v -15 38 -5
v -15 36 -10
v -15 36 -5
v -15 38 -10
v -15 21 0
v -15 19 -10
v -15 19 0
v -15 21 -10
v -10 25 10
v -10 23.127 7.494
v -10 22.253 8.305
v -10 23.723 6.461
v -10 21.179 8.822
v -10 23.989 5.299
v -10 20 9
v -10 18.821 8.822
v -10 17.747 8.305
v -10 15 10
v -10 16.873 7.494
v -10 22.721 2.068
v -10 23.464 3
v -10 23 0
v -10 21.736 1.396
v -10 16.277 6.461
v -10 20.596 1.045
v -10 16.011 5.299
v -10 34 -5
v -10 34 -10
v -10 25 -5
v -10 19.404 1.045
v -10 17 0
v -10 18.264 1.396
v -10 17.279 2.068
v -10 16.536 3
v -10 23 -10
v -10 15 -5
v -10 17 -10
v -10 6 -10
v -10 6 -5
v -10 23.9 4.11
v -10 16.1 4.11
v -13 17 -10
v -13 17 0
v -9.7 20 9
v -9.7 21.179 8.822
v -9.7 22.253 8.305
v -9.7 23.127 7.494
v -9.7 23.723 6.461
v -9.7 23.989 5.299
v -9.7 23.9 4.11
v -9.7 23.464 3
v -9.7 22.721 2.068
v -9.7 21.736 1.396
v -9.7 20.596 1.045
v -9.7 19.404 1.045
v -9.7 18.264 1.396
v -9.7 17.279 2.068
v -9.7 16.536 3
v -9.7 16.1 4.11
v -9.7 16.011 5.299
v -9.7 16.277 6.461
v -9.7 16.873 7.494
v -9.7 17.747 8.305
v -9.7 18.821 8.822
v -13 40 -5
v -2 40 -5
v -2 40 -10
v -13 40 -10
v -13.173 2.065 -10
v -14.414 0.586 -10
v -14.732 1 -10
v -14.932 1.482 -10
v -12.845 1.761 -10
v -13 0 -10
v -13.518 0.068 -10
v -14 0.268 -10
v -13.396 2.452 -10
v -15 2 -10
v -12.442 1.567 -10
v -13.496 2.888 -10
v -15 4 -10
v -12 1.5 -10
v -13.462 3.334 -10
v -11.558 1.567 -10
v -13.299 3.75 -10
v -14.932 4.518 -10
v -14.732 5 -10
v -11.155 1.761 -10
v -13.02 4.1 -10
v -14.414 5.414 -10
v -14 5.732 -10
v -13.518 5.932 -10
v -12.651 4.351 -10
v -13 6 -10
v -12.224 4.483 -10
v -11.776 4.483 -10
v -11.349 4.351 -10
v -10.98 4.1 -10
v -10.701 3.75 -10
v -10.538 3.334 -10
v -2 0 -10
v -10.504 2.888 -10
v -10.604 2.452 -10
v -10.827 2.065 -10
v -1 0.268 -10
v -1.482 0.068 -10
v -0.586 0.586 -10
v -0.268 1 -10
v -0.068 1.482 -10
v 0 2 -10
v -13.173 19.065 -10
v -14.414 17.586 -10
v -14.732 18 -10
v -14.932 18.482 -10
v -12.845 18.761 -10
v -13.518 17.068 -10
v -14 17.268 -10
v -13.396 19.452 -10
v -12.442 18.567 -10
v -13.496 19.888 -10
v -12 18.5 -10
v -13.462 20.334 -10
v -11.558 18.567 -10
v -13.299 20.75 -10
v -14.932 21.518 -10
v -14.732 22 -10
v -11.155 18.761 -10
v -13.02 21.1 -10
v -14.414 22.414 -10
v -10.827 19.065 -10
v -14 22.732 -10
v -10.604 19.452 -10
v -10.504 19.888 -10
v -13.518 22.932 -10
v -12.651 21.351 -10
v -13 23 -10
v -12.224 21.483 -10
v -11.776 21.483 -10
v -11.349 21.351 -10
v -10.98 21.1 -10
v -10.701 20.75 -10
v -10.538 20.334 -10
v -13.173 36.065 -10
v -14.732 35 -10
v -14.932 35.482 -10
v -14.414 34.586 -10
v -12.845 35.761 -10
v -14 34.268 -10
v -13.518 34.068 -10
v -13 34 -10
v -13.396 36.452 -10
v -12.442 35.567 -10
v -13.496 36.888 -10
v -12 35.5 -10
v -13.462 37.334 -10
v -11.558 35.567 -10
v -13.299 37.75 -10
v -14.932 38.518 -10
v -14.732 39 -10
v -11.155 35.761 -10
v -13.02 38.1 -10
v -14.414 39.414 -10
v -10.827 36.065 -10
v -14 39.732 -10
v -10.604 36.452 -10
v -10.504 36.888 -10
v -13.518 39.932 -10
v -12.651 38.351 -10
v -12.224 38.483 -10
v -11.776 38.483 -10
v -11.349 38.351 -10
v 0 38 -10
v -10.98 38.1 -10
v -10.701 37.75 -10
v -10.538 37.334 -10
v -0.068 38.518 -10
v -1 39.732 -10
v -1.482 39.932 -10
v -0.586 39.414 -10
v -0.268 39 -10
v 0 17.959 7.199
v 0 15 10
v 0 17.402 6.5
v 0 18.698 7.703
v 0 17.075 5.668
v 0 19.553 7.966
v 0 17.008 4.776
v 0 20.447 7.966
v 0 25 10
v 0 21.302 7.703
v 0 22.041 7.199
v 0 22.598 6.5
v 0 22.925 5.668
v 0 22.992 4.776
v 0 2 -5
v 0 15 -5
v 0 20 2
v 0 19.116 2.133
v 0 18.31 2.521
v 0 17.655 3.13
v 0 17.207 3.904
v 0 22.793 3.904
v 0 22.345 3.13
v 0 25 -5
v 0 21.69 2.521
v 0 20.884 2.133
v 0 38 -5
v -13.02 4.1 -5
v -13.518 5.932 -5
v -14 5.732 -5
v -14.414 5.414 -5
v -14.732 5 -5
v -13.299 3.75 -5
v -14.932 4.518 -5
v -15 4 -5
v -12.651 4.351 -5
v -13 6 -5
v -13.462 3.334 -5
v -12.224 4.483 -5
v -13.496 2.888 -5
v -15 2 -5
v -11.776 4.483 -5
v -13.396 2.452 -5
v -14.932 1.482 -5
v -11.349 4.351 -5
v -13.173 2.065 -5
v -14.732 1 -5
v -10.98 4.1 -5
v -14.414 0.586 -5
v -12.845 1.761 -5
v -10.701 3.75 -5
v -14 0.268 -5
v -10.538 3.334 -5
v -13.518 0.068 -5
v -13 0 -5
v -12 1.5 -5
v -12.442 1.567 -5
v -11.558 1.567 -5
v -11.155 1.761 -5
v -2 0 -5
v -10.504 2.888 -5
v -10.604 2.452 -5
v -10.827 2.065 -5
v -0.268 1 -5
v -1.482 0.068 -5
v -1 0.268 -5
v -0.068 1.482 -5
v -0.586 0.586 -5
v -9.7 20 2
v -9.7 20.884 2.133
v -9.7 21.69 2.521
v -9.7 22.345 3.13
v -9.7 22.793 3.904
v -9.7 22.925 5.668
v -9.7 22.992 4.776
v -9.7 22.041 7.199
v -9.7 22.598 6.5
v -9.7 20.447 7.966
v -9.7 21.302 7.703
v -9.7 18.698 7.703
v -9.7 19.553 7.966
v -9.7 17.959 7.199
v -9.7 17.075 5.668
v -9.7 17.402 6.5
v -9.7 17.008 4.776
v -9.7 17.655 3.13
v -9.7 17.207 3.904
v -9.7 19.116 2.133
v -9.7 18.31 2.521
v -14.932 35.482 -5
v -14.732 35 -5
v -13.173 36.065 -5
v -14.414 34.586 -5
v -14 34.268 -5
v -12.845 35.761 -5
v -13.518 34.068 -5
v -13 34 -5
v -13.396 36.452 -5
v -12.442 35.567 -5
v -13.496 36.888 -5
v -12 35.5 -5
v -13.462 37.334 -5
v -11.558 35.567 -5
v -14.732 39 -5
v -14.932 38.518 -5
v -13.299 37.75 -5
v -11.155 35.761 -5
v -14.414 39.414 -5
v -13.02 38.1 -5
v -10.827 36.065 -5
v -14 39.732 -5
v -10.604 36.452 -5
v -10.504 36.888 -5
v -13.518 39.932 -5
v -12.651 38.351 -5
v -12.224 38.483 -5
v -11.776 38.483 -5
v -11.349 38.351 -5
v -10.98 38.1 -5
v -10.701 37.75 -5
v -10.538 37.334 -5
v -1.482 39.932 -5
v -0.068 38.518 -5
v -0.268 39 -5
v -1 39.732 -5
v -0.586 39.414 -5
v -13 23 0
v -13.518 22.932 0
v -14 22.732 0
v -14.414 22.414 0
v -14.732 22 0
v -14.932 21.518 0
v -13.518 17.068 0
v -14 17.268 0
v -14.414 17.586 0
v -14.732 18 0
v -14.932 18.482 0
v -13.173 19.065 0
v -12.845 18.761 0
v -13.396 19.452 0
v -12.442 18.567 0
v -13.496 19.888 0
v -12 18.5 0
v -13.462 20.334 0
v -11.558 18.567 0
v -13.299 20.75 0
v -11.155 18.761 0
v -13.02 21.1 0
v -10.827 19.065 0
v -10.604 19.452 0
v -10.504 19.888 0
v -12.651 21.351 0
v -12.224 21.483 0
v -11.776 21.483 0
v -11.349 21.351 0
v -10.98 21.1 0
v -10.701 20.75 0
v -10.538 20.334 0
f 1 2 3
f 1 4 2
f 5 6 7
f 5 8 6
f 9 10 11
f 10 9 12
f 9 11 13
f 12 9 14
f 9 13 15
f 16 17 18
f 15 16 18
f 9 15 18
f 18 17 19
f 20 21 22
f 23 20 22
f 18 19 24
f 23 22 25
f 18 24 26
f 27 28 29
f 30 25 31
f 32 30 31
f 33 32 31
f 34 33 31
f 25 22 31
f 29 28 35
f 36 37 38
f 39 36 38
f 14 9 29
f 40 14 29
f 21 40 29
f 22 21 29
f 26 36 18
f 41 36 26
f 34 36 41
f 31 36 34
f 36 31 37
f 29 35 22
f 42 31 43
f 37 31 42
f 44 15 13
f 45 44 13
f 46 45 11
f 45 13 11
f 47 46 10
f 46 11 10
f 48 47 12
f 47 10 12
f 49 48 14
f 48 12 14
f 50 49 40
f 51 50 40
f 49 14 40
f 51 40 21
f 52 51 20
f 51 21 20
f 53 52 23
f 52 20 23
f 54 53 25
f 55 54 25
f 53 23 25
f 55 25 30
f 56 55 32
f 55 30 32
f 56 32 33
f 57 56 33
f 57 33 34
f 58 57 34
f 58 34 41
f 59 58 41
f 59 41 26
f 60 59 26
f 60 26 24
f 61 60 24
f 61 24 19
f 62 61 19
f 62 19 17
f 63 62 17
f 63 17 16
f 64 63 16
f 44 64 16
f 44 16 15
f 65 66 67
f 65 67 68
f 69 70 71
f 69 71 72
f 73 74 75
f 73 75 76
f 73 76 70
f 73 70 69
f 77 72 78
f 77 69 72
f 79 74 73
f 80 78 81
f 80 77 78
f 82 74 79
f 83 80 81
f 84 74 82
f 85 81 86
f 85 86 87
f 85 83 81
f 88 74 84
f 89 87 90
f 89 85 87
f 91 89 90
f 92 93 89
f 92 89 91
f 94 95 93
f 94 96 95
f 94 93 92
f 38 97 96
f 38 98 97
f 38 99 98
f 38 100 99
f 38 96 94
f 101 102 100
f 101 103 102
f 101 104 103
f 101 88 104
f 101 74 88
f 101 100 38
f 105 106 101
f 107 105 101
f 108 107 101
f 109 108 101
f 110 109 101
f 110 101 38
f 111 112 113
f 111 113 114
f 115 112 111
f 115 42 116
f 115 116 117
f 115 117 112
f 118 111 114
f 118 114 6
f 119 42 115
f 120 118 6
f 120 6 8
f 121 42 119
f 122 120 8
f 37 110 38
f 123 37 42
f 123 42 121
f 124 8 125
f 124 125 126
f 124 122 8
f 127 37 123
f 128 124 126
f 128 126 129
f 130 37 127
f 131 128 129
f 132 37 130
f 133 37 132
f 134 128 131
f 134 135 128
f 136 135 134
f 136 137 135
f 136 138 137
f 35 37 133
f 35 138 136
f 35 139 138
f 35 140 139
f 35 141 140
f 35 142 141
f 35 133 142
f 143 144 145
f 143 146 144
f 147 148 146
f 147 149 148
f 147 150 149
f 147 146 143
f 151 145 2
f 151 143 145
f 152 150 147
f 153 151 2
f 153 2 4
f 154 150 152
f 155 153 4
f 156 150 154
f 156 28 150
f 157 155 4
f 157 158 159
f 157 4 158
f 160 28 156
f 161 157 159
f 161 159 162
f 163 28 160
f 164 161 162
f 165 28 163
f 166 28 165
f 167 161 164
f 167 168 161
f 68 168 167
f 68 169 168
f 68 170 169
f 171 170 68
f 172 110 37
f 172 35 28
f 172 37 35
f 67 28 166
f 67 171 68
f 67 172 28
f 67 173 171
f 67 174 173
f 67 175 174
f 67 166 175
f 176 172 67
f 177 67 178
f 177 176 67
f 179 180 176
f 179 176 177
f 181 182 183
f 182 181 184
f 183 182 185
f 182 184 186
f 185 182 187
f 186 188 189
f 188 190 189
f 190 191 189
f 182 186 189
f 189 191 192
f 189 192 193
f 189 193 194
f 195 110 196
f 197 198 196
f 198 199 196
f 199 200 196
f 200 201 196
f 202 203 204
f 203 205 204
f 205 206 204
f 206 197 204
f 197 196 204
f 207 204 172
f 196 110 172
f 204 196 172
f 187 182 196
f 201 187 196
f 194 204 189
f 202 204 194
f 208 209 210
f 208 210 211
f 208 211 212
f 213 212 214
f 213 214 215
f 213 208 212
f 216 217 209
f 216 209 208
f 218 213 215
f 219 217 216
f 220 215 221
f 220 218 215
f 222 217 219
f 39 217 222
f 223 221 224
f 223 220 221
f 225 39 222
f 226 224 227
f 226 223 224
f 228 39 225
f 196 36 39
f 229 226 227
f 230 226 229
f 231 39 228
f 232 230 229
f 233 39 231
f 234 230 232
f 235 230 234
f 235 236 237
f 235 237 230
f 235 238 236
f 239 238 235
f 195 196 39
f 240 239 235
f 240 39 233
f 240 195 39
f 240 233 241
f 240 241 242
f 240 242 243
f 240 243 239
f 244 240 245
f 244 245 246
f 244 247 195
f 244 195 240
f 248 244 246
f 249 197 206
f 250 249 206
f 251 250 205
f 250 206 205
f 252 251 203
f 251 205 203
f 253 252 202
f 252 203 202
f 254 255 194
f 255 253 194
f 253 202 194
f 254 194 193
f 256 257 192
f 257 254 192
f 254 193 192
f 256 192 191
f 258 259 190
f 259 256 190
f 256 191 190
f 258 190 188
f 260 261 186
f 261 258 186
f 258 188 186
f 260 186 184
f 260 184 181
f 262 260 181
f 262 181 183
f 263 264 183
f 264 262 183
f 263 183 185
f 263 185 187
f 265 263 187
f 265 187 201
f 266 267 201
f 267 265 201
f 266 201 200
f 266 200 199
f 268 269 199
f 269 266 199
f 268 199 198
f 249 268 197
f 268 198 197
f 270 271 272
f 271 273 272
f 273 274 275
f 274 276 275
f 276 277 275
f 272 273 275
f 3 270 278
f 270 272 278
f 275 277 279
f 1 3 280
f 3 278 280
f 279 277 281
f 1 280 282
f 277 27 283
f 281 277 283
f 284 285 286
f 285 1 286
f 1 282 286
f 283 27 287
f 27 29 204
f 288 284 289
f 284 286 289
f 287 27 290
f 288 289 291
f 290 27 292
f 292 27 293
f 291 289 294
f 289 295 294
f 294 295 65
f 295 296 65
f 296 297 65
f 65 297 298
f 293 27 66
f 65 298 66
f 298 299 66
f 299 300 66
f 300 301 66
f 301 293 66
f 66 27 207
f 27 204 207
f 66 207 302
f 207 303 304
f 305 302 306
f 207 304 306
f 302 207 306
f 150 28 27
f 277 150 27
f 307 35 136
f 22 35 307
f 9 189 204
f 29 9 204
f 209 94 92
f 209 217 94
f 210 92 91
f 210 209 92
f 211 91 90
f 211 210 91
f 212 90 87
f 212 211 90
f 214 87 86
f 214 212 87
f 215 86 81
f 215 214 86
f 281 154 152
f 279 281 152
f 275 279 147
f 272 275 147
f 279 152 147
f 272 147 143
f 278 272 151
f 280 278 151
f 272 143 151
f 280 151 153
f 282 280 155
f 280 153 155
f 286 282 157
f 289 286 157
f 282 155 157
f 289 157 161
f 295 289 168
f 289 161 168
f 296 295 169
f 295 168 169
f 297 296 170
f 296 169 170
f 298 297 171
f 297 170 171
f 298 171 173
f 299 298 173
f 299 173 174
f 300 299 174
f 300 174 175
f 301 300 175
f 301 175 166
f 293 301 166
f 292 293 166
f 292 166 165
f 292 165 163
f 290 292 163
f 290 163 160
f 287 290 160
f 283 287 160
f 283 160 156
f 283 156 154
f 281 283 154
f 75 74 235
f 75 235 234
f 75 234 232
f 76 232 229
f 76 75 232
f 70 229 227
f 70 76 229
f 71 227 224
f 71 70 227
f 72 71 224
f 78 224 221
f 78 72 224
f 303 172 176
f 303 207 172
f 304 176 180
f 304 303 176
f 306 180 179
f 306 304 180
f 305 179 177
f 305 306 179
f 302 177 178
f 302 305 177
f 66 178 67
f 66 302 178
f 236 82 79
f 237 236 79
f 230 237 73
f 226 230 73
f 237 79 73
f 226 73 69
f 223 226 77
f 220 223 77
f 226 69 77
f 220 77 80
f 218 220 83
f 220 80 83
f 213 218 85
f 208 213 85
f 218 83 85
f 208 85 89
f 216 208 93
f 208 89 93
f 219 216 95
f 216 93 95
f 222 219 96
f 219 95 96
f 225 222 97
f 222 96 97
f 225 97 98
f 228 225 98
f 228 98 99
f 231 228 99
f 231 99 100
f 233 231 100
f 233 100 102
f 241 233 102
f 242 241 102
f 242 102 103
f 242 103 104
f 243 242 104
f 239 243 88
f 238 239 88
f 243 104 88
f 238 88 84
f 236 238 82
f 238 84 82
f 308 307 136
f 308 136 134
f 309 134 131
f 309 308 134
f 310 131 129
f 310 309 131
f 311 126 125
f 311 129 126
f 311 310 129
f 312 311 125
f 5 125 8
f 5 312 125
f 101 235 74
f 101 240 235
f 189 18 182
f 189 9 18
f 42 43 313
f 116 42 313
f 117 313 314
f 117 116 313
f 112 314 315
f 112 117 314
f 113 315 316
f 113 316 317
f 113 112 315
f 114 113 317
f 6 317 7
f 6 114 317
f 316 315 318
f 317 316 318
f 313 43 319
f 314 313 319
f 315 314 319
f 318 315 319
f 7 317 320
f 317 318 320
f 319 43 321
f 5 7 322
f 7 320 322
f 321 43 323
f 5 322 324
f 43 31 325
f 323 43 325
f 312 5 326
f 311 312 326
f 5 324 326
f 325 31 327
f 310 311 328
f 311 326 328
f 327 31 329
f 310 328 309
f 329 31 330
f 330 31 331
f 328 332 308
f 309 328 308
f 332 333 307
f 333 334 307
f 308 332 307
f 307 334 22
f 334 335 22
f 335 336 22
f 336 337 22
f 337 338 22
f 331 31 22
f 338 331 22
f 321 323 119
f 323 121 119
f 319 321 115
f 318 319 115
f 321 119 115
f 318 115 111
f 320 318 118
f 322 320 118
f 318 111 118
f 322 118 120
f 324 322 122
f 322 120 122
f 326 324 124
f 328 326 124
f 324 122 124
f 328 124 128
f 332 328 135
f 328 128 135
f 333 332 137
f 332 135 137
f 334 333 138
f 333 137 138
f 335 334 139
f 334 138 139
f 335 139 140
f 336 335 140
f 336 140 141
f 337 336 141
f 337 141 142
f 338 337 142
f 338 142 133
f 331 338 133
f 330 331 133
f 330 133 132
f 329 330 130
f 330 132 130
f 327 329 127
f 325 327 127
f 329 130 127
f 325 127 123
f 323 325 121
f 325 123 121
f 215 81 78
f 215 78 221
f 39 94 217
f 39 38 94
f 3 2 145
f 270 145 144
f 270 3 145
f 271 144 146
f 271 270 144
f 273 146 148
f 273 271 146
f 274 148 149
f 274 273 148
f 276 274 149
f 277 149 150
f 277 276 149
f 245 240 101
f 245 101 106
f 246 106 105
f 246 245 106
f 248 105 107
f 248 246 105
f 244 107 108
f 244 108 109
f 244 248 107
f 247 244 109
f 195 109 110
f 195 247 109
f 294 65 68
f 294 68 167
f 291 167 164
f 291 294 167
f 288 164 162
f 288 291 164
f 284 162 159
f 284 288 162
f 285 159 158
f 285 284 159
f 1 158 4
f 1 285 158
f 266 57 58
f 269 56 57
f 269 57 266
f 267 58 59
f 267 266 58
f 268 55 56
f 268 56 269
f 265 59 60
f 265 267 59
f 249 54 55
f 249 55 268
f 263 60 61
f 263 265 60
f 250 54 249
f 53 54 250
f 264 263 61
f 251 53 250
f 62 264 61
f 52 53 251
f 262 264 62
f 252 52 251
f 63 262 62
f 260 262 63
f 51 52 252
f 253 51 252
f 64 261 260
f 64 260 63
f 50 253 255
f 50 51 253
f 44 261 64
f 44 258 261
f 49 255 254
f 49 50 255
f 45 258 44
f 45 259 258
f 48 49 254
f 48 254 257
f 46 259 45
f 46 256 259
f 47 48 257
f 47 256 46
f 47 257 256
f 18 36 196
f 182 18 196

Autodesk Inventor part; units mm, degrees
ref_plane "YZ Plane" through (0, 0, 0) normal (1, 0, 0) x (0, 1, 0)
ref_plane "XZ Plane" through (0, 0, 0) normal (0, 1, 0) x (-1, 0, 0)
sketch "Sketch1" plane through (0, 0, 0) normal (0, 1, 0) x (-1, 0, 0)
  line L0 (0, 0) -> (10, 0)
  line L1 (10, 0) -> (10, -10)
  line L2 (10, -10) -> (0, -10)
  line L3 (0, -10) -> (0, 0)
  dimension "d0" = 10
  dimension "d1" = 10
extrude "Extrusion1" add sketch "Sketch1" along normal blind 40
sketch "Sketch2" plane through (-10, 0, -10) normal (-1, 0, 0) x (0, 0, 1)
  line L0 (0, 40) -> (10, 40) projected
  line L1 (10, 40) -> (0, 40)
  line L2 (0, 40) -> (0, 34)
  line L3 (0, 34) -> (10, 34)
  line L4 (10, 34) -> (10, 40)
  point P0 (10, 0)
  dimension "d4" = 10
  dimension "d5" = 6
extrude "Extrusion2" add sketch "Sketch2" along normal blind 5
sketch "Sketch3" plane through (-10, 0, -10) normal (-1, 0, 0) x (0, 0, 1)
  line L0 (10, 0) -> (10, 40) projected
  line L1 (10, 0) -> (0, 0)
  line L2 (0, 0) -> (0, 6)
  line L3 (0, 6) -> (10, 6)
  line L4 (10, 6) -> (10, 0)
  dimension "d8" = 10
  dimension "d9" = 6
extrude "Extrusion3" add sketch "Sketch3" along normal blind 5
sketch "Sketch4" plane through (-10, 34, -10) normal (-1, 0, 0) x (0, 0, 1)
  line L0 (10, -34) -> (10, 6) projected
  line L1 (10, -34) -> (10, -14)
  line L2 (10, -14) -> (10, -17)
  line L3 (10, -17) -> (0, -17)
  line L4 (0, -17) -> (0, -11)
  line L5 (0, -11) -> (10, -11)
  line L6 (10, -11) -> (10, -17)
  point P0 (10, -11)
  dimension "d12" = 20
  dimension "d13" = 3
  dimension "d14" = 10
  dimension "d15" = 6
extrude "Extrusion4" add sketch "Sketch4" along normal blind 5
sketch "Sketch5" plane through (0, 0, 0) normal (0, 0, 1) x (1, 0, 0)
  line L0 (-15, 0) -> (-15, 6) projected
  line L1 (-15, 3) -> (-12, 3)
  line L2 (-15, 23) -> (-15, 17) projected
  line L3 (-15, 20) -> (-12, 20)
  line L4 (-15, 34) -> (-15, 40) projected
  line L5 (-15, 37) -> (-12, 37)
  point P0 (0, 0)
  dimension "d18" = 3
  dimension "d19" = 3
  dimension "d20" = 3
hole "Hole1" at (-12, 37, 0) at (-12, 20, 0) at (-12, 3, 0) direction (0, 0, -1) diameter 3 end through all
fillet "Fillet1" radius 2 8 edges at (-15, 17, -5) (-15, 23, -5) (-15, 40, -5) (-15, 34, -5) (-15, 6, -5) (-15, 0, -5) (0, 40, -5) (0, 0, -5)
sketch "Sketch6" plane through (0, 2, -10) normal (1, 0, 0) x (0, 0, -1)
  point P0 (-10, -2)
sketch "Sketch7" plane through (0, 0, 0) normal (0, 0, 1) x (1, 0, 0)
  point P0 (0, 0)
ref_plane "Work Plane1" through (0, 0, -5) normal (0, 0, 1) x (1, 0, 0)
sketch "Sketch10" plane through (0, 0, -5) normal (0, 0, 1) x (1, 0, 0)
  point P0 (0, 0)
sketch "Sketch12" plane through (-10, 23, 0) normal (0, 0, 1) x (1, 0, 0)
  line L0 (10, -23) -> (10, -3)
  line L1 (10, -23) -> (30, -23) construction
  line L2 (10, -3) -> (10, 2)
  line L3 (0, 0) -> (0, 11) projected
  line L4 (10, 2) -> (0, 2)
  line L5 (0, 2) -> (0, -8)
  line L6 (0, -8) -> (10, -8)
  line L7 (10, -8) -> (10, 2)
  dimension "d45" = 20
  dimension "d46" = 90
  dimension "d47" = 5
  dimension "d48" = 10
  dimension "d49" = 10
extrude "Extrusion6" add sketch "Sketch12" along normal blind 10
sketch "Sketch13" plane through (0, 2, -10) normal (1, 0, 0) x (0, 0, -1)
  line L0 (-10, 13) -> (-20, 13) projected
  line L1 (-18, 13) -> (-18, 18)
  line L2 (-18, 23) -> (-18, 13) projected
  line L3 (-18, 18) -> (-15, 18)
  circle A0 centre (-15, 18) radius 3
  point P0 (-10, -2)
  point P1 (-12, 13)
  dimension "d54" = 5
  dimension "d55" = 3
  dimension "d56" = 6
extrude "Extrusion7" cut sketch "Sketch13" against normal blind 10
sketch "Sketch14" plane through (0, 2, -10) normal (1, 0, 0) x (0, 0, -1)
  arc A0 (-10, 11) -> (-12, 13) centre (-12, 11) ccw projected
  line L0 (-12, 13) -> (-5, 13)
  line L1 (-5, 13) -> (-5, -2)
  line L2 (0, -2) -> (-10, -2) projected
  line L3 (-5, -2) -> (-5, 38)
  line L4 (-10, 38) -> (0, 38) projected
  line L5 (-5, -2) -> (-12, -2)
  line L6 (-12, -2) -> (-12, 13)
  line L7 (-12, 13) -> (-5, 13)
  line L8 (-5, 13) -> (-5, -2)
  arc A1 (-12, 23) -> (-10, 25) centre (-12, 25) ccw projected
  line L9 (-5, 38) -> (-12, 38)
  line L10 (-12, 38) -> (-12, 23)
  line L11 (-12, 23) -> (-5, 23)
  line L12 (-5, 23) -> (-5, 38)
  dimension "d59" = 7
extrude "Extrusion8" cut sketch "Sketch14" against normal blind 30
sketch "Sketch15" plane through (-10, 23, -10) normal (-1, 0, 0) x (0, 0, 1)
  circle A0 centre (15, -3) radius 3 projected
  circle A1 centre (15, -3) radius 4
  point P0 (10, -23)
  dimension "d62" = 8
extrude "Extrusion9" cut sketch "Sketch15" against normal blind 0.3
properties part number "STUURAS"
